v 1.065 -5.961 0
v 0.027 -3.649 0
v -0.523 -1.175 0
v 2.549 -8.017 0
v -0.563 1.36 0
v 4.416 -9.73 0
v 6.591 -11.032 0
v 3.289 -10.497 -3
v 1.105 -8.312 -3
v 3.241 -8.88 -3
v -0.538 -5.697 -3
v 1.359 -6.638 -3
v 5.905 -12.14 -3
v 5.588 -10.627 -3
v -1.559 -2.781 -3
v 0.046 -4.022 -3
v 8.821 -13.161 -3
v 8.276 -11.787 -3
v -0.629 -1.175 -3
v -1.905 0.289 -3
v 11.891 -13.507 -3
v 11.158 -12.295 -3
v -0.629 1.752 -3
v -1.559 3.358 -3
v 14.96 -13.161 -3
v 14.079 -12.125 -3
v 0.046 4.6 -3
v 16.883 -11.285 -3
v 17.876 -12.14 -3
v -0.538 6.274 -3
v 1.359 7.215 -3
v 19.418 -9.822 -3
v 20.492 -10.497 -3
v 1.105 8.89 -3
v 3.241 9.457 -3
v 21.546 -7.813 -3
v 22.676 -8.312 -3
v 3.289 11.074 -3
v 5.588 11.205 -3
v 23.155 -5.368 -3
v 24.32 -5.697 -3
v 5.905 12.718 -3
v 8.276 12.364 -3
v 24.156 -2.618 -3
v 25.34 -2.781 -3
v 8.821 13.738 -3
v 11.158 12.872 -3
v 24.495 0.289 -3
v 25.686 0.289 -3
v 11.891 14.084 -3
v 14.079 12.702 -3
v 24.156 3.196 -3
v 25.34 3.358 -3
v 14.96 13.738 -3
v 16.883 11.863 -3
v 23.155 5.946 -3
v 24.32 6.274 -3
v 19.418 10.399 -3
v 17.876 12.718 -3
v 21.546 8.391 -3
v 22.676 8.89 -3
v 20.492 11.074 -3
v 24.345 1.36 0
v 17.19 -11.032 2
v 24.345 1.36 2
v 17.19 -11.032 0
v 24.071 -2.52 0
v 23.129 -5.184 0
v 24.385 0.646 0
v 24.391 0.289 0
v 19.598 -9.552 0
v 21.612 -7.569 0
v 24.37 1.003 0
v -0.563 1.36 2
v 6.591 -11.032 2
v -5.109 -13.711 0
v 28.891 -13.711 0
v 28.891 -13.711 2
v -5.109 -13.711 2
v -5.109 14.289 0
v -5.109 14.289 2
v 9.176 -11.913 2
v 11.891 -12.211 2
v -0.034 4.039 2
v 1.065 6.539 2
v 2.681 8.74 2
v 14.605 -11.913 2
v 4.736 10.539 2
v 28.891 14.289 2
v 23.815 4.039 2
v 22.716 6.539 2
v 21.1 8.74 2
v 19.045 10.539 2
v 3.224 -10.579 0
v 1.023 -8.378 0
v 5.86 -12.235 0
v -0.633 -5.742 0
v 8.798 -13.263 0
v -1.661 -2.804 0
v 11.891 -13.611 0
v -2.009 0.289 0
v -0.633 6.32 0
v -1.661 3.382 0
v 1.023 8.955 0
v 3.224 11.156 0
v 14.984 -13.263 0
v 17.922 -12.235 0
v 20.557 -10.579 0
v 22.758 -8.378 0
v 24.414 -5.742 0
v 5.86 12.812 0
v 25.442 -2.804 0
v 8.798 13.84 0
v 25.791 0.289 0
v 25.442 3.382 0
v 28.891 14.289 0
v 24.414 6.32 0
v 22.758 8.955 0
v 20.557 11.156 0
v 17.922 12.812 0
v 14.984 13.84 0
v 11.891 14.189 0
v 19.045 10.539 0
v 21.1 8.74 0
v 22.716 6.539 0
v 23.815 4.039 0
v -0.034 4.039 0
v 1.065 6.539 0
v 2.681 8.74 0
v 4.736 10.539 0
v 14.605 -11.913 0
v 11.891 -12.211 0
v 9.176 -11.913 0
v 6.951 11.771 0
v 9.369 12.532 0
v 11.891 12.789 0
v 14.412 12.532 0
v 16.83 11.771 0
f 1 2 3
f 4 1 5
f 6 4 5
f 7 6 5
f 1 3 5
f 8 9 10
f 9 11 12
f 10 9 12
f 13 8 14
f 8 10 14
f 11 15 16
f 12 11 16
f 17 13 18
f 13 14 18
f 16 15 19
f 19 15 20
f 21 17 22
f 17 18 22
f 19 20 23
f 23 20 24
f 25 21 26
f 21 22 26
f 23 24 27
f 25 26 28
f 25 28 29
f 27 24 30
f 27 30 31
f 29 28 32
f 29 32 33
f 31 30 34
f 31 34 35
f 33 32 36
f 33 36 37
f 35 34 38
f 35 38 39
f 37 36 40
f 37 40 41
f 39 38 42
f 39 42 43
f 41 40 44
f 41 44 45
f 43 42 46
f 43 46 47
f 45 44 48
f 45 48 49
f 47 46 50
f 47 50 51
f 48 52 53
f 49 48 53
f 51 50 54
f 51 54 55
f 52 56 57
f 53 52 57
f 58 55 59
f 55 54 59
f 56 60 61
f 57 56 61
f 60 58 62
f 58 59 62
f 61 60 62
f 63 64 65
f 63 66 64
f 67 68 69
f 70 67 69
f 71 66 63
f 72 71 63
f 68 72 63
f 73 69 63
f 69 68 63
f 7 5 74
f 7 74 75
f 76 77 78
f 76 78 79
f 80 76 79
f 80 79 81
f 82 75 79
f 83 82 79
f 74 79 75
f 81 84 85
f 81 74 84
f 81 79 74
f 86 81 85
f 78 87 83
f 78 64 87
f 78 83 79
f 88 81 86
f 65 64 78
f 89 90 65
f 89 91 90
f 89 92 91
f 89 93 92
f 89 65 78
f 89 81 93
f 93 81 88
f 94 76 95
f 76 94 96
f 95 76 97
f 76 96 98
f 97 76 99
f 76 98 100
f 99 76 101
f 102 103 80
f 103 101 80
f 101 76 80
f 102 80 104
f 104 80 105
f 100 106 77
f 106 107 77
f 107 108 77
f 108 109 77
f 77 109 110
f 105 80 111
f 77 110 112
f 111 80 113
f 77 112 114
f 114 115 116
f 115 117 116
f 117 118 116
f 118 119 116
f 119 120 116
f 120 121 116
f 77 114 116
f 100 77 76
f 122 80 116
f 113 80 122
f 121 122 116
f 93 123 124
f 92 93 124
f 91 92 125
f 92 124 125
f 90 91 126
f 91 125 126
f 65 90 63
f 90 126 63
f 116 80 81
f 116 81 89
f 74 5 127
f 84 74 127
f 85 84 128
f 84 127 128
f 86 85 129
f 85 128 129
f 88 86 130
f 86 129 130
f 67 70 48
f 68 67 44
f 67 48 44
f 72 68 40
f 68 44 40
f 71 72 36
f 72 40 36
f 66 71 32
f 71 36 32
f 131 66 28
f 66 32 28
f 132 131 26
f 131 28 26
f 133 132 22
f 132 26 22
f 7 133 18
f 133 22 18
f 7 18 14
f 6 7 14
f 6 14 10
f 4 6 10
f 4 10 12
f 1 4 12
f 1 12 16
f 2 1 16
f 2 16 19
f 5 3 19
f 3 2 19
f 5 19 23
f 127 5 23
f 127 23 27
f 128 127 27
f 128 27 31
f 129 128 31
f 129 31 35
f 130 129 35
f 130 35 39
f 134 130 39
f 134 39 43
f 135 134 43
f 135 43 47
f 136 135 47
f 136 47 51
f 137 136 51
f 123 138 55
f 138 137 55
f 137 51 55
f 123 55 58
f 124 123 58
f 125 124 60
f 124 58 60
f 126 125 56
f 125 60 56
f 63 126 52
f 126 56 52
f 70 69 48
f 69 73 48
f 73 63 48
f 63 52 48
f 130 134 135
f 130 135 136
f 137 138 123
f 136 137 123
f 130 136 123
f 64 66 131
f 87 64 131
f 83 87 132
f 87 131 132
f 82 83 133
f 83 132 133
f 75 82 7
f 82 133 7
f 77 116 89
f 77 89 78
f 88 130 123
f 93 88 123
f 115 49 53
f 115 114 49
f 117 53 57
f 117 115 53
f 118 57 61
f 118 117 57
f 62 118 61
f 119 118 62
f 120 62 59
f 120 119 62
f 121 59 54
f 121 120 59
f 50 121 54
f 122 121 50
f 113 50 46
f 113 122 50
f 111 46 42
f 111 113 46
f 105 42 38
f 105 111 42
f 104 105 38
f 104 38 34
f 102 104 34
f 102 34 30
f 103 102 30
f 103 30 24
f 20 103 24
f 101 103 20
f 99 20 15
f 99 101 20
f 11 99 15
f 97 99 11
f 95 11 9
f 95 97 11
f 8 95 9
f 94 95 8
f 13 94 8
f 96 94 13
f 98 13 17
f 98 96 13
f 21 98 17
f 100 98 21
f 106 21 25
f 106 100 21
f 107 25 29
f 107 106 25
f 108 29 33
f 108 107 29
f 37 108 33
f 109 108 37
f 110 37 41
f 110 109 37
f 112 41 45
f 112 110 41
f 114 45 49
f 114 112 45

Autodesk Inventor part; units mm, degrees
ref_plane "YZ Plane" through (0, 0, 0) normal (1, 0, 0) x (0, 1, 0)
ref_plane "XZ Plane" through (0, 0, 0) normal (0, 1, 0) x (-1, 0, 0)
ref_plane "XY Plane" through (0, 0, 0) normal (0, 0, 1) x (1, 0, 0)
ref_plane "Work Plane1" through (0, 0, 0) normal (0, 0, 1) x (1, 0, 0)
sketch "Sketch1" plane through (0, 0, 0) normal (0, 0, 1) x (1, 0, 0)
  circle A0 centre (11.8906, 0.2887) radius 14 construction
  line L0 (-4.1094, 7.6362) -> (-12.7094, 0.2473) construction
  line L1 (-5.7094, 0.2473) -> (-12.7094, 0.2473) construction
  line L2 (-5.7094, -6.0861) -> (-5.7094, 0.2473) construction
  line L3 (-6.0301, -6.0861) -> (-5.7094, -6.0861) construction
  line L4 (-6.0301, -6.0861) -> (-4.1094, -7.5697) construction
  line L5 (-4.1094, -7.5697) -> (-4.1094, -15.7113) construction
  line L6 (-4.1094, -15.7113) -> (27.8906, -15.7113) construction
  line L7 (27.8906, -15.7113) -> (27.8906, -7.5697) construction
  line L8 (29.8113, -6.0861) -> (27.8906, -7.5697) construction
  line L9 (29.4906, -6.0861) -> (29.8113, -6.0861) construction
  line L10 (29.4906, 0.2473) -> (29.4906, -6.0861) construction
  line L11 (36.4906, 0.2473) -> (29.4906, 0.2473) construction
  line L12 (27.8906, 7.6362) -> (36.4906, 0.2473) construction
  line L13 (27.8906, 7.6362) -> (27.8906, 16.2887) construction
  line L14 (27.8906, 16.2887) -> (-4.1094, 16.2887) construction
  line L15 (-4.1094, 16.2887) -> (-4.1094, 7.6362) construction
  circle A1 centre (11.8906, 0.2887) radius 13.9
  circle A2 centre (11.8906, 0.2887) radius 12.5
  point P0 (0, 0)
  dimension "d0" = 27.8
  dimension "d1" = 25
extrude "Extrusion1" add sketch "Sketch1" against normal blind 3 draft -2
sketch "Sketch2" plane through (11.8906, 0.2887, 0) normal (0, 0, 1) x (1, 0, 0)
  circle A0 centre (0, 0) radius 13.9 projected
  circle A1 centre (0, 0) radius 12.5 projected
  line L0 (17, -14) -> (-17, -14)
  line L1 (-17, -14) -> (-17, 14)
  line L2 (-17, 14) -> (17, 14)
  line L3 (17, 14) -> (17, -14)
  line L4 (17, -14) -> (-17, 14) construction
  line L5 (-17, -14) -> (17, 14) construction
  circle A2 centre (0, 0) radius 10.25 construction
  line L6 (-7.1545, 10.25) -> (7.1545, 10.25)
  line L7 (-12.454, 1.071) -> (-5.2995, -11.321)
  line L8 (5.2995, -11.321) -> (12.454, 1.071)
  point P0 (-11.8906, -0.2887)
  dimension "d4" = 34
  dimension "d5" = 28
  dimension "d8" = 20.5
  dimension "d9" = 60
  dimension "d10" = 60
  dimension "d11" = 0
extrude "Extrusion2" add sketch "Sketch2" along normal blind 2 contours A0 | A1 L8 | L6 A1 | A1 L7 | L0 L1 L2 L3
properties part number "20_Cube_Insert_Z-Focus_objectivemount"
